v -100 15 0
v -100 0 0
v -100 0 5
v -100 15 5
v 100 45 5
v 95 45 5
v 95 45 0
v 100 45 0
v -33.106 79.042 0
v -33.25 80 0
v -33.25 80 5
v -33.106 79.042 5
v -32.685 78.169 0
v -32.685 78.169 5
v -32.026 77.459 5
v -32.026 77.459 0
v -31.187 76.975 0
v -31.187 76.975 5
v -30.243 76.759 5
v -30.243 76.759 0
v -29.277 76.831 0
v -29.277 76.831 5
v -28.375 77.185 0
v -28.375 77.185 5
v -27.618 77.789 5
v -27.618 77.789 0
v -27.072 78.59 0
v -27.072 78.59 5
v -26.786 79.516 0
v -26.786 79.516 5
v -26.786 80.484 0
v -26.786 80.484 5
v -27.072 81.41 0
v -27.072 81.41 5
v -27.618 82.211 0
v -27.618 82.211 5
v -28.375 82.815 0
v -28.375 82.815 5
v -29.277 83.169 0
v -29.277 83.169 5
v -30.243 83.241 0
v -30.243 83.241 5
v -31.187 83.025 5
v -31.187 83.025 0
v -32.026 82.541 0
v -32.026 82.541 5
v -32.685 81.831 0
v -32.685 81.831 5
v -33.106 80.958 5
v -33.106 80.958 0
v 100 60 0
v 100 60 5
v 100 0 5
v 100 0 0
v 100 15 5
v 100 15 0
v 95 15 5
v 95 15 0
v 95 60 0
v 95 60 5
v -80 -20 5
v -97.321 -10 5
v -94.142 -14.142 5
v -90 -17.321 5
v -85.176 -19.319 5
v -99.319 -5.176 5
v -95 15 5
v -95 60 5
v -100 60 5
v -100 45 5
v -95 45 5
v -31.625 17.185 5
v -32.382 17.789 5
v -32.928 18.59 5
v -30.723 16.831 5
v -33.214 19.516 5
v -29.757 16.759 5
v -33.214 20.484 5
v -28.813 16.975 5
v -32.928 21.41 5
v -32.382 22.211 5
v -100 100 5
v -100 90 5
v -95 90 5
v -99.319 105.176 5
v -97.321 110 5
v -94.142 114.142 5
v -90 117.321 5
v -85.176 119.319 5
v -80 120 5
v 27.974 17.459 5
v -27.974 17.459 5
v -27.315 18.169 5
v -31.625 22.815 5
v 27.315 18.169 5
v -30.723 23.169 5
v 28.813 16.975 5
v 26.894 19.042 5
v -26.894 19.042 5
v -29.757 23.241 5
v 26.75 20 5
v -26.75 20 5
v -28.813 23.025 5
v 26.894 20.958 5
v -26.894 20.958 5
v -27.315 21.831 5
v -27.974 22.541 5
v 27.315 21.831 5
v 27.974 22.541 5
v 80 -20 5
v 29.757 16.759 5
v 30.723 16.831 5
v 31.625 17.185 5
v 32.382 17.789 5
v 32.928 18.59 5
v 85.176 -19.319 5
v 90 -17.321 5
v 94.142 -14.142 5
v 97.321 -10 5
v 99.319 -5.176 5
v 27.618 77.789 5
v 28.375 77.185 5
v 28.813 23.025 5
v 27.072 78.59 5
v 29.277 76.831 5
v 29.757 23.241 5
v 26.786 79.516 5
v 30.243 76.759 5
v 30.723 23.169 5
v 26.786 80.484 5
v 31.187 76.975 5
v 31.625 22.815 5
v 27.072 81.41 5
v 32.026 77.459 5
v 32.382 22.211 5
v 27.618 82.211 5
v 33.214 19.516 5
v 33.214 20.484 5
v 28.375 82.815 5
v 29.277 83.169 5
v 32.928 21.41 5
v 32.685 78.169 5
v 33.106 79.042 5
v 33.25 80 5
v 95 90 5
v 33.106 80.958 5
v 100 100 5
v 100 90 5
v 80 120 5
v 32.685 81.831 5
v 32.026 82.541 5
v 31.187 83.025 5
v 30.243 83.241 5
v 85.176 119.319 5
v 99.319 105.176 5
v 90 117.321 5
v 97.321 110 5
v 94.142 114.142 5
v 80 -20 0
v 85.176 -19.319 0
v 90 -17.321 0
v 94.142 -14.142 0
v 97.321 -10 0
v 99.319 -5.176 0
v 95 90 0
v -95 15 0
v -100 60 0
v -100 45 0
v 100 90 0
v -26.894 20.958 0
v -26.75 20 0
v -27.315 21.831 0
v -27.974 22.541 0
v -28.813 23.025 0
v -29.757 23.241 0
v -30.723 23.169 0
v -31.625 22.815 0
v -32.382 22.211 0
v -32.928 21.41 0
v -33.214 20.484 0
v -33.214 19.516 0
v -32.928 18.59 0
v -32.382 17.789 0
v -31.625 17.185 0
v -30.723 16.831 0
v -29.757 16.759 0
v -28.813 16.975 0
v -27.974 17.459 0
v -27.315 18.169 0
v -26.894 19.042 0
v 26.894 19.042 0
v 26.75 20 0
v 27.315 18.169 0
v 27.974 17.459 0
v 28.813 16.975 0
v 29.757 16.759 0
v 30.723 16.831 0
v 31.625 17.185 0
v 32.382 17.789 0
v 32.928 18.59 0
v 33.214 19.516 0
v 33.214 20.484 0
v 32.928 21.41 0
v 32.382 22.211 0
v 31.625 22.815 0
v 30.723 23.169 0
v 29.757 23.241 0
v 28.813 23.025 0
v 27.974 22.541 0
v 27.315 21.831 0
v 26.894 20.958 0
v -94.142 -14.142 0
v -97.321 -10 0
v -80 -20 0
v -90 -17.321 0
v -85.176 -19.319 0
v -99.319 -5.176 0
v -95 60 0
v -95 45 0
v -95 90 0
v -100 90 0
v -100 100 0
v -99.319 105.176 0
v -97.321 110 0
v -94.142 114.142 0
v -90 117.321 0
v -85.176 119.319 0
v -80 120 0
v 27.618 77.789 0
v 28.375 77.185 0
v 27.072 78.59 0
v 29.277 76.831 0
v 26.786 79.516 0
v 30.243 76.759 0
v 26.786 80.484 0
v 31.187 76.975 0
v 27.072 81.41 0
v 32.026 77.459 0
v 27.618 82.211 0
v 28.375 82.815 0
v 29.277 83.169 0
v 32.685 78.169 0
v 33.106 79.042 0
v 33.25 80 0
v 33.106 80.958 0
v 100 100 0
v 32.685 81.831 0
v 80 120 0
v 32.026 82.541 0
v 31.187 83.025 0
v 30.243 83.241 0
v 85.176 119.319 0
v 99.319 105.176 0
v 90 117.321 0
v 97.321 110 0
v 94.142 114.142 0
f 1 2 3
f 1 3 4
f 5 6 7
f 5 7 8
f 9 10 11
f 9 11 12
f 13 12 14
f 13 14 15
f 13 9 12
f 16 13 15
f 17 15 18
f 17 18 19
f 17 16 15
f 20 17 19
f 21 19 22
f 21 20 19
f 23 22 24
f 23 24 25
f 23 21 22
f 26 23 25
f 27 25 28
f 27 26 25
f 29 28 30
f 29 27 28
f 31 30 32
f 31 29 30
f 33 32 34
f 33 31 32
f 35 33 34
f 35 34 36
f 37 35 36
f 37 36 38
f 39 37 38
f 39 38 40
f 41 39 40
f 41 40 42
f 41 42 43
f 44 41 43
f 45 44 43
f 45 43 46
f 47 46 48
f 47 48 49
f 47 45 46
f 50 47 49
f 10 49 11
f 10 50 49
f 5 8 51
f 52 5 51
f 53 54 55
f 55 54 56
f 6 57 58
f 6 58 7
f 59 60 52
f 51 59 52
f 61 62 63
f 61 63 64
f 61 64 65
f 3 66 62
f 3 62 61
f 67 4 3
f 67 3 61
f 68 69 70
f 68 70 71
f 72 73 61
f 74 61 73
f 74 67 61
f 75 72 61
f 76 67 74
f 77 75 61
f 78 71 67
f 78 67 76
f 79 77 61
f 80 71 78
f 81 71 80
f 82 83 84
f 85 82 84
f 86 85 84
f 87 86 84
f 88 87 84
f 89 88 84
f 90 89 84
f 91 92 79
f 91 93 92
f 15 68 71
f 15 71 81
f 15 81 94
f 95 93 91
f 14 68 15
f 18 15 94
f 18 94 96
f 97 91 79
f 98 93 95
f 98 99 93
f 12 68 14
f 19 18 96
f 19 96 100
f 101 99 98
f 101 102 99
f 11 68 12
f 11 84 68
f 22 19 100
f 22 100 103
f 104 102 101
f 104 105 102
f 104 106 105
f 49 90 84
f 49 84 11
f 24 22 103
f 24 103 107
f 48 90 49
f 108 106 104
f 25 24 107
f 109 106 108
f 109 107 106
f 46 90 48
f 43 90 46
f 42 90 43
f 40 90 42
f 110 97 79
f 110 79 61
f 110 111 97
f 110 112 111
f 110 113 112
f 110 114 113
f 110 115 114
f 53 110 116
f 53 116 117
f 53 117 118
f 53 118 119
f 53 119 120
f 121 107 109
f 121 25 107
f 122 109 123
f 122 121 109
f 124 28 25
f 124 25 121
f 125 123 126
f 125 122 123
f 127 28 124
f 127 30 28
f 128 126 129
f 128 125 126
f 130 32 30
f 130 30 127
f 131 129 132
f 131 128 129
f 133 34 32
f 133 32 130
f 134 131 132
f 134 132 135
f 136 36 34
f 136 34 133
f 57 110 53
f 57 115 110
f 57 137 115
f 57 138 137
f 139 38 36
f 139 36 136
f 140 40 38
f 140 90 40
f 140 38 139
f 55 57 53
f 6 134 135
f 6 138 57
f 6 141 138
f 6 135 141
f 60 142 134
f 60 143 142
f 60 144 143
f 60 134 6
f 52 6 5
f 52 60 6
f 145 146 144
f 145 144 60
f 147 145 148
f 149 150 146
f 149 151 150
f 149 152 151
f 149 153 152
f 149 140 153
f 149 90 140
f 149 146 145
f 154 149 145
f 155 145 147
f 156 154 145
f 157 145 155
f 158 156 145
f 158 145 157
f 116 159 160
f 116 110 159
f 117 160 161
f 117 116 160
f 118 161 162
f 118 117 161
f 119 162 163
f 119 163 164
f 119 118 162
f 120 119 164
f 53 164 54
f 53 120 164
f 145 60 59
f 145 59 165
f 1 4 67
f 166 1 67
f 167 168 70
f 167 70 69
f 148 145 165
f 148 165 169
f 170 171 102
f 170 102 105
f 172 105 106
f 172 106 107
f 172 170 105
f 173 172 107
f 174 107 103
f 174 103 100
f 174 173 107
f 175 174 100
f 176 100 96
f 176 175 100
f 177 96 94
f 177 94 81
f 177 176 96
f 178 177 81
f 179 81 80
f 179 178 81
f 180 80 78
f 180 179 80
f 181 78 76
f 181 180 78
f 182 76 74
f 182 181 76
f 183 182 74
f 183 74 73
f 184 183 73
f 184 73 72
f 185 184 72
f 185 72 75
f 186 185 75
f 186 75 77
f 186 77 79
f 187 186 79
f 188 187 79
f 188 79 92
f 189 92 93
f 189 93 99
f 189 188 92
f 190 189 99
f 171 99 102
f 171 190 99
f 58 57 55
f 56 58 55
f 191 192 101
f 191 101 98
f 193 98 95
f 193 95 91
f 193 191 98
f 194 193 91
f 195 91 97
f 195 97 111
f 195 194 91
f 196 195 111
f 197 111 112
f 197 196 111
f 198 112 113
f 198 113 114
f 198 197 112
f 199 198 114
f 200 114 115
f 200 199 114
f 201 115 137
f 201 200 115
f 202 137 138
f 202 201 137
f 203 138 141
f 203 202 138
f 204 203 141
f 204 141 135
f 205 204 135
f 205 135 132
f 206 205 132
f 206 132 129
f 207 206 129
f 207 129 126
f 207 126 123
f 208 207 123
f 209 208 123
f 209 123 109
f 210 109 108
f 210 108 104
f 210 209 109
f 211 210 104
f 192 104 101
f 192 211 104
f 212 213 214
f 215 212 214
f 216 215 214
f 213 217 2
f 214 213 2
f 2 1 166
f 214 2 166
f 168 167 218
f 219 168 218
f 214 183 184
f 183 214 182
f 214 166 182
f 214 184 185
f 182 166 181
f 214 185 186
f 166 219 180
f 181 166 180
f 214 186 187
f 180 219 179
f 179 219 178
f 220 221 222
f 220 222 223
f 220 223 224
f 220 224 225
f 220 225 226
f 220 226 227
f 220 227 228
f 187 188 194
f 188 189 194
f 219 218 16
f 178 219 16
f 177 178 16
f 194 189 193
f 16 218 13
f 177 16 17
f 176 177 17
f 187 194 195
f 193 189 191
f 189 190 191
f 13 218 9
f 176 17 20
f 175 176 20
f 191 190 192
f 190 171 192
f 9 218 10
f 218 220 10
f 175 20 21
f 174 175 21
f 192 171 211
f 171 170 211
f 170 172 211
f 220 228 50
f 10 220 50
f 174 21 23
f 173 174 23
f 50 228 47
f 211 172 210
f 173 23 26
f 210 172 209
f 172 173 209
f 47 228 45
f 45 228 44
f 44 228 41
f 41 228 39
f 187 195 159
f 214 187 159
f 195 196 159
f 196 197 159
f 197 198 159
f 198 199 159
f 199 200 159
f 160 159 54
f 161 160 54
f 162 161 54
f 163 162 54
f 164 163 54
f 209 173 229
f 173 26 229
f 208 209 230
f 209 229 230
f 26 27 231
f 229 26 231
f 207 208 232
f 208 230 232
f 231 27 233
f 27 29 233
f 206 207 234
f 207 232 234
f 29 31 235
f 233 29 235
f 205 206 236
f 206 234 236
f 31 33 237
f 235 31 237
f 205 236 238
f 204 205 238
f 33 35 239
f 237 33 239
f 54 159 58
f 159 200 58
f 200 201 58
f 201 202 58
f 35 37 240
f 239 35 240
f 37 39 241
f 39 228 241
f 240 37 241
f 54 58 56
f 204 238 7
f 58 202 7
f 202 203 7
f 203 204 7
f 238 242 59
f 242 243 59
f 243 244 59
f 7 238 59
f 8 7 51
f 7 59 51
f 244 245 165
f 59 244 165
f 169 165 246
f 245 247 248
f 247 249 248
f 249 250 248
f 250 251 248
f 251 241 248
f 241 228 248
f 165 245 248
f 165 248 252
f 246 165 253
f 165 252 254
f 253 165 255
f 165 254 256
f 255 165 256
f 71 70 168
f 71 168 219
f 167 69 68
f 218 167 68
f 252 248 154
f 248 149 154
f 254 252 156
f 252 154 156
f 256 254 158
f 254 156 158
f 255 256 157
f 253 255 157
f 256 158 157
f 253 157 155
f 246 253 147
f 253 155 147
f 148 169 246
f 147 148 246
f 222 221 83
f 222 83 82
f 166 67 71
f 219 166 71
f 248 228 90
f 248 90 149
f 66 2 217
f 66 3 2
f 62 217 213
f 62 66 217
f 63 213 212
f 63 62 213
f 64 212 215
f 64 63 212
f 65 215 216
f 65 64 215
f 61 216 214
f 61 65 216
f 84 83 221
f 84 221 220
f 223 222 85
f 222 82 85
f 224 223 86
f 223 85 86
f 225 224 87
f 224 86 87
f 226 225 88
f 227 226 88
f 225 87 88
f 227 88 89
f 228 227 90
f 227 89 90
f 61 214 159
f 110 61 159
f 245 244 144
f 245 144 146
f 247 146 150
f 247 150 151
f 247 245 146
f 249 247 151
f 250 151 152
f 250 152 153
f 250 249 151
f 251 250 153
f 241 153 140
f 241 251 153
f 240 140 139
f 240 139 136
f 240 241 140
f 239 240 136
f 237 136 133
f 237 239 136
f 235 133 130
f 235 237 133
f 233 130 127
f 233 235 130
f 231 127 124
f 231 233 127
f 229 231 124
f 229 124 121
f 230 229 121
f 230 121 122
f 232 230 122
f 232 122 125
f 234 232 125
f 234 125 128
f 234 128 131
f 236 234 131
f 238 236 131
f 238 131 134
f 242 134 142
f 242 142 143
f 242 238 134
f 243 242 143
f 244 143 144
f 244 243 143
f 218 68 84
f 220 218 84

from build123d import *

# Parameters (mm, degrees)
SKETCH_1_W          = 200
SKETCH_1_H          = 140
SKETCH_1_R          = 3.25
EXTRUDE_1_DEPTH     = 5
FILLET_1_R          = 20
SKETCH_3_W          = 5
SKETCH_3_H          = 30
CUT_EXTRUDE_1_DEPTH = 39


with BuildPart() as part:
    # 草图1 → 凸台-拉伸1 (new body)
    with BuildSketch(Plane.XY):
        with Locations((0, 50)):
            Rectangle(SKETCH_1_W, SKETCH_1_H)
        with Locations((30, 80)):
            Circle(SKETCH_1_R, mode=Mode.SUBTRACT)
        with Locations(Location((30, 20, 0), (0, 0, 180))):
            Circle(SKETCH_1_R, mode=Mode.SUBTRACT)
        with Locations(Location((-30, 80, 0), (0, 0, 180))):
            Circle(SKETCH_1_R, mode=Mode.SUBTRACT)
        with Locations((-30, 20)):
            Circle(SKETCH_1_R, mode=Mode.SUBTRACT)
    extrude(amount=EXTRUDE_1_DEPTH)

    # 圆角1
    fillet_1_edges = [part.edges().sort_by_distance(p)[0] for p in [
        (-100, 120, 2.5),
        (-100, -20, 2.5),
        (100, -20, 2.5),
        (100, 120, 2.5),
    ]]
    fillet(fillet_1_edges, radius=FILLET_1_R)

    # 草图3 → 切除-拉伸1 (cut)
    with BuildSketch(Plane.XY.offset(5)):
        with Locations((97.5, 75)):
            Rectangle(SKETCH_3_W, SKETCH_3_H)
        with Locations((97.5, 30)):
            Rectangle(SKETCH_3_W, SKETCH_3_H)
        with Locations((-97.5, 30)):
            Rectangle(SKETCH_3_W, SKETCH_3_H)
        with Locations((-97.5, 75)):
            Rectangle(SKETCH_3_W, SKETCH_3_H)
    extrude(amount=-CUT_EXTRUDE_1_DEPTH, mode=Mode.SUBTRACT)


solid = part.part
